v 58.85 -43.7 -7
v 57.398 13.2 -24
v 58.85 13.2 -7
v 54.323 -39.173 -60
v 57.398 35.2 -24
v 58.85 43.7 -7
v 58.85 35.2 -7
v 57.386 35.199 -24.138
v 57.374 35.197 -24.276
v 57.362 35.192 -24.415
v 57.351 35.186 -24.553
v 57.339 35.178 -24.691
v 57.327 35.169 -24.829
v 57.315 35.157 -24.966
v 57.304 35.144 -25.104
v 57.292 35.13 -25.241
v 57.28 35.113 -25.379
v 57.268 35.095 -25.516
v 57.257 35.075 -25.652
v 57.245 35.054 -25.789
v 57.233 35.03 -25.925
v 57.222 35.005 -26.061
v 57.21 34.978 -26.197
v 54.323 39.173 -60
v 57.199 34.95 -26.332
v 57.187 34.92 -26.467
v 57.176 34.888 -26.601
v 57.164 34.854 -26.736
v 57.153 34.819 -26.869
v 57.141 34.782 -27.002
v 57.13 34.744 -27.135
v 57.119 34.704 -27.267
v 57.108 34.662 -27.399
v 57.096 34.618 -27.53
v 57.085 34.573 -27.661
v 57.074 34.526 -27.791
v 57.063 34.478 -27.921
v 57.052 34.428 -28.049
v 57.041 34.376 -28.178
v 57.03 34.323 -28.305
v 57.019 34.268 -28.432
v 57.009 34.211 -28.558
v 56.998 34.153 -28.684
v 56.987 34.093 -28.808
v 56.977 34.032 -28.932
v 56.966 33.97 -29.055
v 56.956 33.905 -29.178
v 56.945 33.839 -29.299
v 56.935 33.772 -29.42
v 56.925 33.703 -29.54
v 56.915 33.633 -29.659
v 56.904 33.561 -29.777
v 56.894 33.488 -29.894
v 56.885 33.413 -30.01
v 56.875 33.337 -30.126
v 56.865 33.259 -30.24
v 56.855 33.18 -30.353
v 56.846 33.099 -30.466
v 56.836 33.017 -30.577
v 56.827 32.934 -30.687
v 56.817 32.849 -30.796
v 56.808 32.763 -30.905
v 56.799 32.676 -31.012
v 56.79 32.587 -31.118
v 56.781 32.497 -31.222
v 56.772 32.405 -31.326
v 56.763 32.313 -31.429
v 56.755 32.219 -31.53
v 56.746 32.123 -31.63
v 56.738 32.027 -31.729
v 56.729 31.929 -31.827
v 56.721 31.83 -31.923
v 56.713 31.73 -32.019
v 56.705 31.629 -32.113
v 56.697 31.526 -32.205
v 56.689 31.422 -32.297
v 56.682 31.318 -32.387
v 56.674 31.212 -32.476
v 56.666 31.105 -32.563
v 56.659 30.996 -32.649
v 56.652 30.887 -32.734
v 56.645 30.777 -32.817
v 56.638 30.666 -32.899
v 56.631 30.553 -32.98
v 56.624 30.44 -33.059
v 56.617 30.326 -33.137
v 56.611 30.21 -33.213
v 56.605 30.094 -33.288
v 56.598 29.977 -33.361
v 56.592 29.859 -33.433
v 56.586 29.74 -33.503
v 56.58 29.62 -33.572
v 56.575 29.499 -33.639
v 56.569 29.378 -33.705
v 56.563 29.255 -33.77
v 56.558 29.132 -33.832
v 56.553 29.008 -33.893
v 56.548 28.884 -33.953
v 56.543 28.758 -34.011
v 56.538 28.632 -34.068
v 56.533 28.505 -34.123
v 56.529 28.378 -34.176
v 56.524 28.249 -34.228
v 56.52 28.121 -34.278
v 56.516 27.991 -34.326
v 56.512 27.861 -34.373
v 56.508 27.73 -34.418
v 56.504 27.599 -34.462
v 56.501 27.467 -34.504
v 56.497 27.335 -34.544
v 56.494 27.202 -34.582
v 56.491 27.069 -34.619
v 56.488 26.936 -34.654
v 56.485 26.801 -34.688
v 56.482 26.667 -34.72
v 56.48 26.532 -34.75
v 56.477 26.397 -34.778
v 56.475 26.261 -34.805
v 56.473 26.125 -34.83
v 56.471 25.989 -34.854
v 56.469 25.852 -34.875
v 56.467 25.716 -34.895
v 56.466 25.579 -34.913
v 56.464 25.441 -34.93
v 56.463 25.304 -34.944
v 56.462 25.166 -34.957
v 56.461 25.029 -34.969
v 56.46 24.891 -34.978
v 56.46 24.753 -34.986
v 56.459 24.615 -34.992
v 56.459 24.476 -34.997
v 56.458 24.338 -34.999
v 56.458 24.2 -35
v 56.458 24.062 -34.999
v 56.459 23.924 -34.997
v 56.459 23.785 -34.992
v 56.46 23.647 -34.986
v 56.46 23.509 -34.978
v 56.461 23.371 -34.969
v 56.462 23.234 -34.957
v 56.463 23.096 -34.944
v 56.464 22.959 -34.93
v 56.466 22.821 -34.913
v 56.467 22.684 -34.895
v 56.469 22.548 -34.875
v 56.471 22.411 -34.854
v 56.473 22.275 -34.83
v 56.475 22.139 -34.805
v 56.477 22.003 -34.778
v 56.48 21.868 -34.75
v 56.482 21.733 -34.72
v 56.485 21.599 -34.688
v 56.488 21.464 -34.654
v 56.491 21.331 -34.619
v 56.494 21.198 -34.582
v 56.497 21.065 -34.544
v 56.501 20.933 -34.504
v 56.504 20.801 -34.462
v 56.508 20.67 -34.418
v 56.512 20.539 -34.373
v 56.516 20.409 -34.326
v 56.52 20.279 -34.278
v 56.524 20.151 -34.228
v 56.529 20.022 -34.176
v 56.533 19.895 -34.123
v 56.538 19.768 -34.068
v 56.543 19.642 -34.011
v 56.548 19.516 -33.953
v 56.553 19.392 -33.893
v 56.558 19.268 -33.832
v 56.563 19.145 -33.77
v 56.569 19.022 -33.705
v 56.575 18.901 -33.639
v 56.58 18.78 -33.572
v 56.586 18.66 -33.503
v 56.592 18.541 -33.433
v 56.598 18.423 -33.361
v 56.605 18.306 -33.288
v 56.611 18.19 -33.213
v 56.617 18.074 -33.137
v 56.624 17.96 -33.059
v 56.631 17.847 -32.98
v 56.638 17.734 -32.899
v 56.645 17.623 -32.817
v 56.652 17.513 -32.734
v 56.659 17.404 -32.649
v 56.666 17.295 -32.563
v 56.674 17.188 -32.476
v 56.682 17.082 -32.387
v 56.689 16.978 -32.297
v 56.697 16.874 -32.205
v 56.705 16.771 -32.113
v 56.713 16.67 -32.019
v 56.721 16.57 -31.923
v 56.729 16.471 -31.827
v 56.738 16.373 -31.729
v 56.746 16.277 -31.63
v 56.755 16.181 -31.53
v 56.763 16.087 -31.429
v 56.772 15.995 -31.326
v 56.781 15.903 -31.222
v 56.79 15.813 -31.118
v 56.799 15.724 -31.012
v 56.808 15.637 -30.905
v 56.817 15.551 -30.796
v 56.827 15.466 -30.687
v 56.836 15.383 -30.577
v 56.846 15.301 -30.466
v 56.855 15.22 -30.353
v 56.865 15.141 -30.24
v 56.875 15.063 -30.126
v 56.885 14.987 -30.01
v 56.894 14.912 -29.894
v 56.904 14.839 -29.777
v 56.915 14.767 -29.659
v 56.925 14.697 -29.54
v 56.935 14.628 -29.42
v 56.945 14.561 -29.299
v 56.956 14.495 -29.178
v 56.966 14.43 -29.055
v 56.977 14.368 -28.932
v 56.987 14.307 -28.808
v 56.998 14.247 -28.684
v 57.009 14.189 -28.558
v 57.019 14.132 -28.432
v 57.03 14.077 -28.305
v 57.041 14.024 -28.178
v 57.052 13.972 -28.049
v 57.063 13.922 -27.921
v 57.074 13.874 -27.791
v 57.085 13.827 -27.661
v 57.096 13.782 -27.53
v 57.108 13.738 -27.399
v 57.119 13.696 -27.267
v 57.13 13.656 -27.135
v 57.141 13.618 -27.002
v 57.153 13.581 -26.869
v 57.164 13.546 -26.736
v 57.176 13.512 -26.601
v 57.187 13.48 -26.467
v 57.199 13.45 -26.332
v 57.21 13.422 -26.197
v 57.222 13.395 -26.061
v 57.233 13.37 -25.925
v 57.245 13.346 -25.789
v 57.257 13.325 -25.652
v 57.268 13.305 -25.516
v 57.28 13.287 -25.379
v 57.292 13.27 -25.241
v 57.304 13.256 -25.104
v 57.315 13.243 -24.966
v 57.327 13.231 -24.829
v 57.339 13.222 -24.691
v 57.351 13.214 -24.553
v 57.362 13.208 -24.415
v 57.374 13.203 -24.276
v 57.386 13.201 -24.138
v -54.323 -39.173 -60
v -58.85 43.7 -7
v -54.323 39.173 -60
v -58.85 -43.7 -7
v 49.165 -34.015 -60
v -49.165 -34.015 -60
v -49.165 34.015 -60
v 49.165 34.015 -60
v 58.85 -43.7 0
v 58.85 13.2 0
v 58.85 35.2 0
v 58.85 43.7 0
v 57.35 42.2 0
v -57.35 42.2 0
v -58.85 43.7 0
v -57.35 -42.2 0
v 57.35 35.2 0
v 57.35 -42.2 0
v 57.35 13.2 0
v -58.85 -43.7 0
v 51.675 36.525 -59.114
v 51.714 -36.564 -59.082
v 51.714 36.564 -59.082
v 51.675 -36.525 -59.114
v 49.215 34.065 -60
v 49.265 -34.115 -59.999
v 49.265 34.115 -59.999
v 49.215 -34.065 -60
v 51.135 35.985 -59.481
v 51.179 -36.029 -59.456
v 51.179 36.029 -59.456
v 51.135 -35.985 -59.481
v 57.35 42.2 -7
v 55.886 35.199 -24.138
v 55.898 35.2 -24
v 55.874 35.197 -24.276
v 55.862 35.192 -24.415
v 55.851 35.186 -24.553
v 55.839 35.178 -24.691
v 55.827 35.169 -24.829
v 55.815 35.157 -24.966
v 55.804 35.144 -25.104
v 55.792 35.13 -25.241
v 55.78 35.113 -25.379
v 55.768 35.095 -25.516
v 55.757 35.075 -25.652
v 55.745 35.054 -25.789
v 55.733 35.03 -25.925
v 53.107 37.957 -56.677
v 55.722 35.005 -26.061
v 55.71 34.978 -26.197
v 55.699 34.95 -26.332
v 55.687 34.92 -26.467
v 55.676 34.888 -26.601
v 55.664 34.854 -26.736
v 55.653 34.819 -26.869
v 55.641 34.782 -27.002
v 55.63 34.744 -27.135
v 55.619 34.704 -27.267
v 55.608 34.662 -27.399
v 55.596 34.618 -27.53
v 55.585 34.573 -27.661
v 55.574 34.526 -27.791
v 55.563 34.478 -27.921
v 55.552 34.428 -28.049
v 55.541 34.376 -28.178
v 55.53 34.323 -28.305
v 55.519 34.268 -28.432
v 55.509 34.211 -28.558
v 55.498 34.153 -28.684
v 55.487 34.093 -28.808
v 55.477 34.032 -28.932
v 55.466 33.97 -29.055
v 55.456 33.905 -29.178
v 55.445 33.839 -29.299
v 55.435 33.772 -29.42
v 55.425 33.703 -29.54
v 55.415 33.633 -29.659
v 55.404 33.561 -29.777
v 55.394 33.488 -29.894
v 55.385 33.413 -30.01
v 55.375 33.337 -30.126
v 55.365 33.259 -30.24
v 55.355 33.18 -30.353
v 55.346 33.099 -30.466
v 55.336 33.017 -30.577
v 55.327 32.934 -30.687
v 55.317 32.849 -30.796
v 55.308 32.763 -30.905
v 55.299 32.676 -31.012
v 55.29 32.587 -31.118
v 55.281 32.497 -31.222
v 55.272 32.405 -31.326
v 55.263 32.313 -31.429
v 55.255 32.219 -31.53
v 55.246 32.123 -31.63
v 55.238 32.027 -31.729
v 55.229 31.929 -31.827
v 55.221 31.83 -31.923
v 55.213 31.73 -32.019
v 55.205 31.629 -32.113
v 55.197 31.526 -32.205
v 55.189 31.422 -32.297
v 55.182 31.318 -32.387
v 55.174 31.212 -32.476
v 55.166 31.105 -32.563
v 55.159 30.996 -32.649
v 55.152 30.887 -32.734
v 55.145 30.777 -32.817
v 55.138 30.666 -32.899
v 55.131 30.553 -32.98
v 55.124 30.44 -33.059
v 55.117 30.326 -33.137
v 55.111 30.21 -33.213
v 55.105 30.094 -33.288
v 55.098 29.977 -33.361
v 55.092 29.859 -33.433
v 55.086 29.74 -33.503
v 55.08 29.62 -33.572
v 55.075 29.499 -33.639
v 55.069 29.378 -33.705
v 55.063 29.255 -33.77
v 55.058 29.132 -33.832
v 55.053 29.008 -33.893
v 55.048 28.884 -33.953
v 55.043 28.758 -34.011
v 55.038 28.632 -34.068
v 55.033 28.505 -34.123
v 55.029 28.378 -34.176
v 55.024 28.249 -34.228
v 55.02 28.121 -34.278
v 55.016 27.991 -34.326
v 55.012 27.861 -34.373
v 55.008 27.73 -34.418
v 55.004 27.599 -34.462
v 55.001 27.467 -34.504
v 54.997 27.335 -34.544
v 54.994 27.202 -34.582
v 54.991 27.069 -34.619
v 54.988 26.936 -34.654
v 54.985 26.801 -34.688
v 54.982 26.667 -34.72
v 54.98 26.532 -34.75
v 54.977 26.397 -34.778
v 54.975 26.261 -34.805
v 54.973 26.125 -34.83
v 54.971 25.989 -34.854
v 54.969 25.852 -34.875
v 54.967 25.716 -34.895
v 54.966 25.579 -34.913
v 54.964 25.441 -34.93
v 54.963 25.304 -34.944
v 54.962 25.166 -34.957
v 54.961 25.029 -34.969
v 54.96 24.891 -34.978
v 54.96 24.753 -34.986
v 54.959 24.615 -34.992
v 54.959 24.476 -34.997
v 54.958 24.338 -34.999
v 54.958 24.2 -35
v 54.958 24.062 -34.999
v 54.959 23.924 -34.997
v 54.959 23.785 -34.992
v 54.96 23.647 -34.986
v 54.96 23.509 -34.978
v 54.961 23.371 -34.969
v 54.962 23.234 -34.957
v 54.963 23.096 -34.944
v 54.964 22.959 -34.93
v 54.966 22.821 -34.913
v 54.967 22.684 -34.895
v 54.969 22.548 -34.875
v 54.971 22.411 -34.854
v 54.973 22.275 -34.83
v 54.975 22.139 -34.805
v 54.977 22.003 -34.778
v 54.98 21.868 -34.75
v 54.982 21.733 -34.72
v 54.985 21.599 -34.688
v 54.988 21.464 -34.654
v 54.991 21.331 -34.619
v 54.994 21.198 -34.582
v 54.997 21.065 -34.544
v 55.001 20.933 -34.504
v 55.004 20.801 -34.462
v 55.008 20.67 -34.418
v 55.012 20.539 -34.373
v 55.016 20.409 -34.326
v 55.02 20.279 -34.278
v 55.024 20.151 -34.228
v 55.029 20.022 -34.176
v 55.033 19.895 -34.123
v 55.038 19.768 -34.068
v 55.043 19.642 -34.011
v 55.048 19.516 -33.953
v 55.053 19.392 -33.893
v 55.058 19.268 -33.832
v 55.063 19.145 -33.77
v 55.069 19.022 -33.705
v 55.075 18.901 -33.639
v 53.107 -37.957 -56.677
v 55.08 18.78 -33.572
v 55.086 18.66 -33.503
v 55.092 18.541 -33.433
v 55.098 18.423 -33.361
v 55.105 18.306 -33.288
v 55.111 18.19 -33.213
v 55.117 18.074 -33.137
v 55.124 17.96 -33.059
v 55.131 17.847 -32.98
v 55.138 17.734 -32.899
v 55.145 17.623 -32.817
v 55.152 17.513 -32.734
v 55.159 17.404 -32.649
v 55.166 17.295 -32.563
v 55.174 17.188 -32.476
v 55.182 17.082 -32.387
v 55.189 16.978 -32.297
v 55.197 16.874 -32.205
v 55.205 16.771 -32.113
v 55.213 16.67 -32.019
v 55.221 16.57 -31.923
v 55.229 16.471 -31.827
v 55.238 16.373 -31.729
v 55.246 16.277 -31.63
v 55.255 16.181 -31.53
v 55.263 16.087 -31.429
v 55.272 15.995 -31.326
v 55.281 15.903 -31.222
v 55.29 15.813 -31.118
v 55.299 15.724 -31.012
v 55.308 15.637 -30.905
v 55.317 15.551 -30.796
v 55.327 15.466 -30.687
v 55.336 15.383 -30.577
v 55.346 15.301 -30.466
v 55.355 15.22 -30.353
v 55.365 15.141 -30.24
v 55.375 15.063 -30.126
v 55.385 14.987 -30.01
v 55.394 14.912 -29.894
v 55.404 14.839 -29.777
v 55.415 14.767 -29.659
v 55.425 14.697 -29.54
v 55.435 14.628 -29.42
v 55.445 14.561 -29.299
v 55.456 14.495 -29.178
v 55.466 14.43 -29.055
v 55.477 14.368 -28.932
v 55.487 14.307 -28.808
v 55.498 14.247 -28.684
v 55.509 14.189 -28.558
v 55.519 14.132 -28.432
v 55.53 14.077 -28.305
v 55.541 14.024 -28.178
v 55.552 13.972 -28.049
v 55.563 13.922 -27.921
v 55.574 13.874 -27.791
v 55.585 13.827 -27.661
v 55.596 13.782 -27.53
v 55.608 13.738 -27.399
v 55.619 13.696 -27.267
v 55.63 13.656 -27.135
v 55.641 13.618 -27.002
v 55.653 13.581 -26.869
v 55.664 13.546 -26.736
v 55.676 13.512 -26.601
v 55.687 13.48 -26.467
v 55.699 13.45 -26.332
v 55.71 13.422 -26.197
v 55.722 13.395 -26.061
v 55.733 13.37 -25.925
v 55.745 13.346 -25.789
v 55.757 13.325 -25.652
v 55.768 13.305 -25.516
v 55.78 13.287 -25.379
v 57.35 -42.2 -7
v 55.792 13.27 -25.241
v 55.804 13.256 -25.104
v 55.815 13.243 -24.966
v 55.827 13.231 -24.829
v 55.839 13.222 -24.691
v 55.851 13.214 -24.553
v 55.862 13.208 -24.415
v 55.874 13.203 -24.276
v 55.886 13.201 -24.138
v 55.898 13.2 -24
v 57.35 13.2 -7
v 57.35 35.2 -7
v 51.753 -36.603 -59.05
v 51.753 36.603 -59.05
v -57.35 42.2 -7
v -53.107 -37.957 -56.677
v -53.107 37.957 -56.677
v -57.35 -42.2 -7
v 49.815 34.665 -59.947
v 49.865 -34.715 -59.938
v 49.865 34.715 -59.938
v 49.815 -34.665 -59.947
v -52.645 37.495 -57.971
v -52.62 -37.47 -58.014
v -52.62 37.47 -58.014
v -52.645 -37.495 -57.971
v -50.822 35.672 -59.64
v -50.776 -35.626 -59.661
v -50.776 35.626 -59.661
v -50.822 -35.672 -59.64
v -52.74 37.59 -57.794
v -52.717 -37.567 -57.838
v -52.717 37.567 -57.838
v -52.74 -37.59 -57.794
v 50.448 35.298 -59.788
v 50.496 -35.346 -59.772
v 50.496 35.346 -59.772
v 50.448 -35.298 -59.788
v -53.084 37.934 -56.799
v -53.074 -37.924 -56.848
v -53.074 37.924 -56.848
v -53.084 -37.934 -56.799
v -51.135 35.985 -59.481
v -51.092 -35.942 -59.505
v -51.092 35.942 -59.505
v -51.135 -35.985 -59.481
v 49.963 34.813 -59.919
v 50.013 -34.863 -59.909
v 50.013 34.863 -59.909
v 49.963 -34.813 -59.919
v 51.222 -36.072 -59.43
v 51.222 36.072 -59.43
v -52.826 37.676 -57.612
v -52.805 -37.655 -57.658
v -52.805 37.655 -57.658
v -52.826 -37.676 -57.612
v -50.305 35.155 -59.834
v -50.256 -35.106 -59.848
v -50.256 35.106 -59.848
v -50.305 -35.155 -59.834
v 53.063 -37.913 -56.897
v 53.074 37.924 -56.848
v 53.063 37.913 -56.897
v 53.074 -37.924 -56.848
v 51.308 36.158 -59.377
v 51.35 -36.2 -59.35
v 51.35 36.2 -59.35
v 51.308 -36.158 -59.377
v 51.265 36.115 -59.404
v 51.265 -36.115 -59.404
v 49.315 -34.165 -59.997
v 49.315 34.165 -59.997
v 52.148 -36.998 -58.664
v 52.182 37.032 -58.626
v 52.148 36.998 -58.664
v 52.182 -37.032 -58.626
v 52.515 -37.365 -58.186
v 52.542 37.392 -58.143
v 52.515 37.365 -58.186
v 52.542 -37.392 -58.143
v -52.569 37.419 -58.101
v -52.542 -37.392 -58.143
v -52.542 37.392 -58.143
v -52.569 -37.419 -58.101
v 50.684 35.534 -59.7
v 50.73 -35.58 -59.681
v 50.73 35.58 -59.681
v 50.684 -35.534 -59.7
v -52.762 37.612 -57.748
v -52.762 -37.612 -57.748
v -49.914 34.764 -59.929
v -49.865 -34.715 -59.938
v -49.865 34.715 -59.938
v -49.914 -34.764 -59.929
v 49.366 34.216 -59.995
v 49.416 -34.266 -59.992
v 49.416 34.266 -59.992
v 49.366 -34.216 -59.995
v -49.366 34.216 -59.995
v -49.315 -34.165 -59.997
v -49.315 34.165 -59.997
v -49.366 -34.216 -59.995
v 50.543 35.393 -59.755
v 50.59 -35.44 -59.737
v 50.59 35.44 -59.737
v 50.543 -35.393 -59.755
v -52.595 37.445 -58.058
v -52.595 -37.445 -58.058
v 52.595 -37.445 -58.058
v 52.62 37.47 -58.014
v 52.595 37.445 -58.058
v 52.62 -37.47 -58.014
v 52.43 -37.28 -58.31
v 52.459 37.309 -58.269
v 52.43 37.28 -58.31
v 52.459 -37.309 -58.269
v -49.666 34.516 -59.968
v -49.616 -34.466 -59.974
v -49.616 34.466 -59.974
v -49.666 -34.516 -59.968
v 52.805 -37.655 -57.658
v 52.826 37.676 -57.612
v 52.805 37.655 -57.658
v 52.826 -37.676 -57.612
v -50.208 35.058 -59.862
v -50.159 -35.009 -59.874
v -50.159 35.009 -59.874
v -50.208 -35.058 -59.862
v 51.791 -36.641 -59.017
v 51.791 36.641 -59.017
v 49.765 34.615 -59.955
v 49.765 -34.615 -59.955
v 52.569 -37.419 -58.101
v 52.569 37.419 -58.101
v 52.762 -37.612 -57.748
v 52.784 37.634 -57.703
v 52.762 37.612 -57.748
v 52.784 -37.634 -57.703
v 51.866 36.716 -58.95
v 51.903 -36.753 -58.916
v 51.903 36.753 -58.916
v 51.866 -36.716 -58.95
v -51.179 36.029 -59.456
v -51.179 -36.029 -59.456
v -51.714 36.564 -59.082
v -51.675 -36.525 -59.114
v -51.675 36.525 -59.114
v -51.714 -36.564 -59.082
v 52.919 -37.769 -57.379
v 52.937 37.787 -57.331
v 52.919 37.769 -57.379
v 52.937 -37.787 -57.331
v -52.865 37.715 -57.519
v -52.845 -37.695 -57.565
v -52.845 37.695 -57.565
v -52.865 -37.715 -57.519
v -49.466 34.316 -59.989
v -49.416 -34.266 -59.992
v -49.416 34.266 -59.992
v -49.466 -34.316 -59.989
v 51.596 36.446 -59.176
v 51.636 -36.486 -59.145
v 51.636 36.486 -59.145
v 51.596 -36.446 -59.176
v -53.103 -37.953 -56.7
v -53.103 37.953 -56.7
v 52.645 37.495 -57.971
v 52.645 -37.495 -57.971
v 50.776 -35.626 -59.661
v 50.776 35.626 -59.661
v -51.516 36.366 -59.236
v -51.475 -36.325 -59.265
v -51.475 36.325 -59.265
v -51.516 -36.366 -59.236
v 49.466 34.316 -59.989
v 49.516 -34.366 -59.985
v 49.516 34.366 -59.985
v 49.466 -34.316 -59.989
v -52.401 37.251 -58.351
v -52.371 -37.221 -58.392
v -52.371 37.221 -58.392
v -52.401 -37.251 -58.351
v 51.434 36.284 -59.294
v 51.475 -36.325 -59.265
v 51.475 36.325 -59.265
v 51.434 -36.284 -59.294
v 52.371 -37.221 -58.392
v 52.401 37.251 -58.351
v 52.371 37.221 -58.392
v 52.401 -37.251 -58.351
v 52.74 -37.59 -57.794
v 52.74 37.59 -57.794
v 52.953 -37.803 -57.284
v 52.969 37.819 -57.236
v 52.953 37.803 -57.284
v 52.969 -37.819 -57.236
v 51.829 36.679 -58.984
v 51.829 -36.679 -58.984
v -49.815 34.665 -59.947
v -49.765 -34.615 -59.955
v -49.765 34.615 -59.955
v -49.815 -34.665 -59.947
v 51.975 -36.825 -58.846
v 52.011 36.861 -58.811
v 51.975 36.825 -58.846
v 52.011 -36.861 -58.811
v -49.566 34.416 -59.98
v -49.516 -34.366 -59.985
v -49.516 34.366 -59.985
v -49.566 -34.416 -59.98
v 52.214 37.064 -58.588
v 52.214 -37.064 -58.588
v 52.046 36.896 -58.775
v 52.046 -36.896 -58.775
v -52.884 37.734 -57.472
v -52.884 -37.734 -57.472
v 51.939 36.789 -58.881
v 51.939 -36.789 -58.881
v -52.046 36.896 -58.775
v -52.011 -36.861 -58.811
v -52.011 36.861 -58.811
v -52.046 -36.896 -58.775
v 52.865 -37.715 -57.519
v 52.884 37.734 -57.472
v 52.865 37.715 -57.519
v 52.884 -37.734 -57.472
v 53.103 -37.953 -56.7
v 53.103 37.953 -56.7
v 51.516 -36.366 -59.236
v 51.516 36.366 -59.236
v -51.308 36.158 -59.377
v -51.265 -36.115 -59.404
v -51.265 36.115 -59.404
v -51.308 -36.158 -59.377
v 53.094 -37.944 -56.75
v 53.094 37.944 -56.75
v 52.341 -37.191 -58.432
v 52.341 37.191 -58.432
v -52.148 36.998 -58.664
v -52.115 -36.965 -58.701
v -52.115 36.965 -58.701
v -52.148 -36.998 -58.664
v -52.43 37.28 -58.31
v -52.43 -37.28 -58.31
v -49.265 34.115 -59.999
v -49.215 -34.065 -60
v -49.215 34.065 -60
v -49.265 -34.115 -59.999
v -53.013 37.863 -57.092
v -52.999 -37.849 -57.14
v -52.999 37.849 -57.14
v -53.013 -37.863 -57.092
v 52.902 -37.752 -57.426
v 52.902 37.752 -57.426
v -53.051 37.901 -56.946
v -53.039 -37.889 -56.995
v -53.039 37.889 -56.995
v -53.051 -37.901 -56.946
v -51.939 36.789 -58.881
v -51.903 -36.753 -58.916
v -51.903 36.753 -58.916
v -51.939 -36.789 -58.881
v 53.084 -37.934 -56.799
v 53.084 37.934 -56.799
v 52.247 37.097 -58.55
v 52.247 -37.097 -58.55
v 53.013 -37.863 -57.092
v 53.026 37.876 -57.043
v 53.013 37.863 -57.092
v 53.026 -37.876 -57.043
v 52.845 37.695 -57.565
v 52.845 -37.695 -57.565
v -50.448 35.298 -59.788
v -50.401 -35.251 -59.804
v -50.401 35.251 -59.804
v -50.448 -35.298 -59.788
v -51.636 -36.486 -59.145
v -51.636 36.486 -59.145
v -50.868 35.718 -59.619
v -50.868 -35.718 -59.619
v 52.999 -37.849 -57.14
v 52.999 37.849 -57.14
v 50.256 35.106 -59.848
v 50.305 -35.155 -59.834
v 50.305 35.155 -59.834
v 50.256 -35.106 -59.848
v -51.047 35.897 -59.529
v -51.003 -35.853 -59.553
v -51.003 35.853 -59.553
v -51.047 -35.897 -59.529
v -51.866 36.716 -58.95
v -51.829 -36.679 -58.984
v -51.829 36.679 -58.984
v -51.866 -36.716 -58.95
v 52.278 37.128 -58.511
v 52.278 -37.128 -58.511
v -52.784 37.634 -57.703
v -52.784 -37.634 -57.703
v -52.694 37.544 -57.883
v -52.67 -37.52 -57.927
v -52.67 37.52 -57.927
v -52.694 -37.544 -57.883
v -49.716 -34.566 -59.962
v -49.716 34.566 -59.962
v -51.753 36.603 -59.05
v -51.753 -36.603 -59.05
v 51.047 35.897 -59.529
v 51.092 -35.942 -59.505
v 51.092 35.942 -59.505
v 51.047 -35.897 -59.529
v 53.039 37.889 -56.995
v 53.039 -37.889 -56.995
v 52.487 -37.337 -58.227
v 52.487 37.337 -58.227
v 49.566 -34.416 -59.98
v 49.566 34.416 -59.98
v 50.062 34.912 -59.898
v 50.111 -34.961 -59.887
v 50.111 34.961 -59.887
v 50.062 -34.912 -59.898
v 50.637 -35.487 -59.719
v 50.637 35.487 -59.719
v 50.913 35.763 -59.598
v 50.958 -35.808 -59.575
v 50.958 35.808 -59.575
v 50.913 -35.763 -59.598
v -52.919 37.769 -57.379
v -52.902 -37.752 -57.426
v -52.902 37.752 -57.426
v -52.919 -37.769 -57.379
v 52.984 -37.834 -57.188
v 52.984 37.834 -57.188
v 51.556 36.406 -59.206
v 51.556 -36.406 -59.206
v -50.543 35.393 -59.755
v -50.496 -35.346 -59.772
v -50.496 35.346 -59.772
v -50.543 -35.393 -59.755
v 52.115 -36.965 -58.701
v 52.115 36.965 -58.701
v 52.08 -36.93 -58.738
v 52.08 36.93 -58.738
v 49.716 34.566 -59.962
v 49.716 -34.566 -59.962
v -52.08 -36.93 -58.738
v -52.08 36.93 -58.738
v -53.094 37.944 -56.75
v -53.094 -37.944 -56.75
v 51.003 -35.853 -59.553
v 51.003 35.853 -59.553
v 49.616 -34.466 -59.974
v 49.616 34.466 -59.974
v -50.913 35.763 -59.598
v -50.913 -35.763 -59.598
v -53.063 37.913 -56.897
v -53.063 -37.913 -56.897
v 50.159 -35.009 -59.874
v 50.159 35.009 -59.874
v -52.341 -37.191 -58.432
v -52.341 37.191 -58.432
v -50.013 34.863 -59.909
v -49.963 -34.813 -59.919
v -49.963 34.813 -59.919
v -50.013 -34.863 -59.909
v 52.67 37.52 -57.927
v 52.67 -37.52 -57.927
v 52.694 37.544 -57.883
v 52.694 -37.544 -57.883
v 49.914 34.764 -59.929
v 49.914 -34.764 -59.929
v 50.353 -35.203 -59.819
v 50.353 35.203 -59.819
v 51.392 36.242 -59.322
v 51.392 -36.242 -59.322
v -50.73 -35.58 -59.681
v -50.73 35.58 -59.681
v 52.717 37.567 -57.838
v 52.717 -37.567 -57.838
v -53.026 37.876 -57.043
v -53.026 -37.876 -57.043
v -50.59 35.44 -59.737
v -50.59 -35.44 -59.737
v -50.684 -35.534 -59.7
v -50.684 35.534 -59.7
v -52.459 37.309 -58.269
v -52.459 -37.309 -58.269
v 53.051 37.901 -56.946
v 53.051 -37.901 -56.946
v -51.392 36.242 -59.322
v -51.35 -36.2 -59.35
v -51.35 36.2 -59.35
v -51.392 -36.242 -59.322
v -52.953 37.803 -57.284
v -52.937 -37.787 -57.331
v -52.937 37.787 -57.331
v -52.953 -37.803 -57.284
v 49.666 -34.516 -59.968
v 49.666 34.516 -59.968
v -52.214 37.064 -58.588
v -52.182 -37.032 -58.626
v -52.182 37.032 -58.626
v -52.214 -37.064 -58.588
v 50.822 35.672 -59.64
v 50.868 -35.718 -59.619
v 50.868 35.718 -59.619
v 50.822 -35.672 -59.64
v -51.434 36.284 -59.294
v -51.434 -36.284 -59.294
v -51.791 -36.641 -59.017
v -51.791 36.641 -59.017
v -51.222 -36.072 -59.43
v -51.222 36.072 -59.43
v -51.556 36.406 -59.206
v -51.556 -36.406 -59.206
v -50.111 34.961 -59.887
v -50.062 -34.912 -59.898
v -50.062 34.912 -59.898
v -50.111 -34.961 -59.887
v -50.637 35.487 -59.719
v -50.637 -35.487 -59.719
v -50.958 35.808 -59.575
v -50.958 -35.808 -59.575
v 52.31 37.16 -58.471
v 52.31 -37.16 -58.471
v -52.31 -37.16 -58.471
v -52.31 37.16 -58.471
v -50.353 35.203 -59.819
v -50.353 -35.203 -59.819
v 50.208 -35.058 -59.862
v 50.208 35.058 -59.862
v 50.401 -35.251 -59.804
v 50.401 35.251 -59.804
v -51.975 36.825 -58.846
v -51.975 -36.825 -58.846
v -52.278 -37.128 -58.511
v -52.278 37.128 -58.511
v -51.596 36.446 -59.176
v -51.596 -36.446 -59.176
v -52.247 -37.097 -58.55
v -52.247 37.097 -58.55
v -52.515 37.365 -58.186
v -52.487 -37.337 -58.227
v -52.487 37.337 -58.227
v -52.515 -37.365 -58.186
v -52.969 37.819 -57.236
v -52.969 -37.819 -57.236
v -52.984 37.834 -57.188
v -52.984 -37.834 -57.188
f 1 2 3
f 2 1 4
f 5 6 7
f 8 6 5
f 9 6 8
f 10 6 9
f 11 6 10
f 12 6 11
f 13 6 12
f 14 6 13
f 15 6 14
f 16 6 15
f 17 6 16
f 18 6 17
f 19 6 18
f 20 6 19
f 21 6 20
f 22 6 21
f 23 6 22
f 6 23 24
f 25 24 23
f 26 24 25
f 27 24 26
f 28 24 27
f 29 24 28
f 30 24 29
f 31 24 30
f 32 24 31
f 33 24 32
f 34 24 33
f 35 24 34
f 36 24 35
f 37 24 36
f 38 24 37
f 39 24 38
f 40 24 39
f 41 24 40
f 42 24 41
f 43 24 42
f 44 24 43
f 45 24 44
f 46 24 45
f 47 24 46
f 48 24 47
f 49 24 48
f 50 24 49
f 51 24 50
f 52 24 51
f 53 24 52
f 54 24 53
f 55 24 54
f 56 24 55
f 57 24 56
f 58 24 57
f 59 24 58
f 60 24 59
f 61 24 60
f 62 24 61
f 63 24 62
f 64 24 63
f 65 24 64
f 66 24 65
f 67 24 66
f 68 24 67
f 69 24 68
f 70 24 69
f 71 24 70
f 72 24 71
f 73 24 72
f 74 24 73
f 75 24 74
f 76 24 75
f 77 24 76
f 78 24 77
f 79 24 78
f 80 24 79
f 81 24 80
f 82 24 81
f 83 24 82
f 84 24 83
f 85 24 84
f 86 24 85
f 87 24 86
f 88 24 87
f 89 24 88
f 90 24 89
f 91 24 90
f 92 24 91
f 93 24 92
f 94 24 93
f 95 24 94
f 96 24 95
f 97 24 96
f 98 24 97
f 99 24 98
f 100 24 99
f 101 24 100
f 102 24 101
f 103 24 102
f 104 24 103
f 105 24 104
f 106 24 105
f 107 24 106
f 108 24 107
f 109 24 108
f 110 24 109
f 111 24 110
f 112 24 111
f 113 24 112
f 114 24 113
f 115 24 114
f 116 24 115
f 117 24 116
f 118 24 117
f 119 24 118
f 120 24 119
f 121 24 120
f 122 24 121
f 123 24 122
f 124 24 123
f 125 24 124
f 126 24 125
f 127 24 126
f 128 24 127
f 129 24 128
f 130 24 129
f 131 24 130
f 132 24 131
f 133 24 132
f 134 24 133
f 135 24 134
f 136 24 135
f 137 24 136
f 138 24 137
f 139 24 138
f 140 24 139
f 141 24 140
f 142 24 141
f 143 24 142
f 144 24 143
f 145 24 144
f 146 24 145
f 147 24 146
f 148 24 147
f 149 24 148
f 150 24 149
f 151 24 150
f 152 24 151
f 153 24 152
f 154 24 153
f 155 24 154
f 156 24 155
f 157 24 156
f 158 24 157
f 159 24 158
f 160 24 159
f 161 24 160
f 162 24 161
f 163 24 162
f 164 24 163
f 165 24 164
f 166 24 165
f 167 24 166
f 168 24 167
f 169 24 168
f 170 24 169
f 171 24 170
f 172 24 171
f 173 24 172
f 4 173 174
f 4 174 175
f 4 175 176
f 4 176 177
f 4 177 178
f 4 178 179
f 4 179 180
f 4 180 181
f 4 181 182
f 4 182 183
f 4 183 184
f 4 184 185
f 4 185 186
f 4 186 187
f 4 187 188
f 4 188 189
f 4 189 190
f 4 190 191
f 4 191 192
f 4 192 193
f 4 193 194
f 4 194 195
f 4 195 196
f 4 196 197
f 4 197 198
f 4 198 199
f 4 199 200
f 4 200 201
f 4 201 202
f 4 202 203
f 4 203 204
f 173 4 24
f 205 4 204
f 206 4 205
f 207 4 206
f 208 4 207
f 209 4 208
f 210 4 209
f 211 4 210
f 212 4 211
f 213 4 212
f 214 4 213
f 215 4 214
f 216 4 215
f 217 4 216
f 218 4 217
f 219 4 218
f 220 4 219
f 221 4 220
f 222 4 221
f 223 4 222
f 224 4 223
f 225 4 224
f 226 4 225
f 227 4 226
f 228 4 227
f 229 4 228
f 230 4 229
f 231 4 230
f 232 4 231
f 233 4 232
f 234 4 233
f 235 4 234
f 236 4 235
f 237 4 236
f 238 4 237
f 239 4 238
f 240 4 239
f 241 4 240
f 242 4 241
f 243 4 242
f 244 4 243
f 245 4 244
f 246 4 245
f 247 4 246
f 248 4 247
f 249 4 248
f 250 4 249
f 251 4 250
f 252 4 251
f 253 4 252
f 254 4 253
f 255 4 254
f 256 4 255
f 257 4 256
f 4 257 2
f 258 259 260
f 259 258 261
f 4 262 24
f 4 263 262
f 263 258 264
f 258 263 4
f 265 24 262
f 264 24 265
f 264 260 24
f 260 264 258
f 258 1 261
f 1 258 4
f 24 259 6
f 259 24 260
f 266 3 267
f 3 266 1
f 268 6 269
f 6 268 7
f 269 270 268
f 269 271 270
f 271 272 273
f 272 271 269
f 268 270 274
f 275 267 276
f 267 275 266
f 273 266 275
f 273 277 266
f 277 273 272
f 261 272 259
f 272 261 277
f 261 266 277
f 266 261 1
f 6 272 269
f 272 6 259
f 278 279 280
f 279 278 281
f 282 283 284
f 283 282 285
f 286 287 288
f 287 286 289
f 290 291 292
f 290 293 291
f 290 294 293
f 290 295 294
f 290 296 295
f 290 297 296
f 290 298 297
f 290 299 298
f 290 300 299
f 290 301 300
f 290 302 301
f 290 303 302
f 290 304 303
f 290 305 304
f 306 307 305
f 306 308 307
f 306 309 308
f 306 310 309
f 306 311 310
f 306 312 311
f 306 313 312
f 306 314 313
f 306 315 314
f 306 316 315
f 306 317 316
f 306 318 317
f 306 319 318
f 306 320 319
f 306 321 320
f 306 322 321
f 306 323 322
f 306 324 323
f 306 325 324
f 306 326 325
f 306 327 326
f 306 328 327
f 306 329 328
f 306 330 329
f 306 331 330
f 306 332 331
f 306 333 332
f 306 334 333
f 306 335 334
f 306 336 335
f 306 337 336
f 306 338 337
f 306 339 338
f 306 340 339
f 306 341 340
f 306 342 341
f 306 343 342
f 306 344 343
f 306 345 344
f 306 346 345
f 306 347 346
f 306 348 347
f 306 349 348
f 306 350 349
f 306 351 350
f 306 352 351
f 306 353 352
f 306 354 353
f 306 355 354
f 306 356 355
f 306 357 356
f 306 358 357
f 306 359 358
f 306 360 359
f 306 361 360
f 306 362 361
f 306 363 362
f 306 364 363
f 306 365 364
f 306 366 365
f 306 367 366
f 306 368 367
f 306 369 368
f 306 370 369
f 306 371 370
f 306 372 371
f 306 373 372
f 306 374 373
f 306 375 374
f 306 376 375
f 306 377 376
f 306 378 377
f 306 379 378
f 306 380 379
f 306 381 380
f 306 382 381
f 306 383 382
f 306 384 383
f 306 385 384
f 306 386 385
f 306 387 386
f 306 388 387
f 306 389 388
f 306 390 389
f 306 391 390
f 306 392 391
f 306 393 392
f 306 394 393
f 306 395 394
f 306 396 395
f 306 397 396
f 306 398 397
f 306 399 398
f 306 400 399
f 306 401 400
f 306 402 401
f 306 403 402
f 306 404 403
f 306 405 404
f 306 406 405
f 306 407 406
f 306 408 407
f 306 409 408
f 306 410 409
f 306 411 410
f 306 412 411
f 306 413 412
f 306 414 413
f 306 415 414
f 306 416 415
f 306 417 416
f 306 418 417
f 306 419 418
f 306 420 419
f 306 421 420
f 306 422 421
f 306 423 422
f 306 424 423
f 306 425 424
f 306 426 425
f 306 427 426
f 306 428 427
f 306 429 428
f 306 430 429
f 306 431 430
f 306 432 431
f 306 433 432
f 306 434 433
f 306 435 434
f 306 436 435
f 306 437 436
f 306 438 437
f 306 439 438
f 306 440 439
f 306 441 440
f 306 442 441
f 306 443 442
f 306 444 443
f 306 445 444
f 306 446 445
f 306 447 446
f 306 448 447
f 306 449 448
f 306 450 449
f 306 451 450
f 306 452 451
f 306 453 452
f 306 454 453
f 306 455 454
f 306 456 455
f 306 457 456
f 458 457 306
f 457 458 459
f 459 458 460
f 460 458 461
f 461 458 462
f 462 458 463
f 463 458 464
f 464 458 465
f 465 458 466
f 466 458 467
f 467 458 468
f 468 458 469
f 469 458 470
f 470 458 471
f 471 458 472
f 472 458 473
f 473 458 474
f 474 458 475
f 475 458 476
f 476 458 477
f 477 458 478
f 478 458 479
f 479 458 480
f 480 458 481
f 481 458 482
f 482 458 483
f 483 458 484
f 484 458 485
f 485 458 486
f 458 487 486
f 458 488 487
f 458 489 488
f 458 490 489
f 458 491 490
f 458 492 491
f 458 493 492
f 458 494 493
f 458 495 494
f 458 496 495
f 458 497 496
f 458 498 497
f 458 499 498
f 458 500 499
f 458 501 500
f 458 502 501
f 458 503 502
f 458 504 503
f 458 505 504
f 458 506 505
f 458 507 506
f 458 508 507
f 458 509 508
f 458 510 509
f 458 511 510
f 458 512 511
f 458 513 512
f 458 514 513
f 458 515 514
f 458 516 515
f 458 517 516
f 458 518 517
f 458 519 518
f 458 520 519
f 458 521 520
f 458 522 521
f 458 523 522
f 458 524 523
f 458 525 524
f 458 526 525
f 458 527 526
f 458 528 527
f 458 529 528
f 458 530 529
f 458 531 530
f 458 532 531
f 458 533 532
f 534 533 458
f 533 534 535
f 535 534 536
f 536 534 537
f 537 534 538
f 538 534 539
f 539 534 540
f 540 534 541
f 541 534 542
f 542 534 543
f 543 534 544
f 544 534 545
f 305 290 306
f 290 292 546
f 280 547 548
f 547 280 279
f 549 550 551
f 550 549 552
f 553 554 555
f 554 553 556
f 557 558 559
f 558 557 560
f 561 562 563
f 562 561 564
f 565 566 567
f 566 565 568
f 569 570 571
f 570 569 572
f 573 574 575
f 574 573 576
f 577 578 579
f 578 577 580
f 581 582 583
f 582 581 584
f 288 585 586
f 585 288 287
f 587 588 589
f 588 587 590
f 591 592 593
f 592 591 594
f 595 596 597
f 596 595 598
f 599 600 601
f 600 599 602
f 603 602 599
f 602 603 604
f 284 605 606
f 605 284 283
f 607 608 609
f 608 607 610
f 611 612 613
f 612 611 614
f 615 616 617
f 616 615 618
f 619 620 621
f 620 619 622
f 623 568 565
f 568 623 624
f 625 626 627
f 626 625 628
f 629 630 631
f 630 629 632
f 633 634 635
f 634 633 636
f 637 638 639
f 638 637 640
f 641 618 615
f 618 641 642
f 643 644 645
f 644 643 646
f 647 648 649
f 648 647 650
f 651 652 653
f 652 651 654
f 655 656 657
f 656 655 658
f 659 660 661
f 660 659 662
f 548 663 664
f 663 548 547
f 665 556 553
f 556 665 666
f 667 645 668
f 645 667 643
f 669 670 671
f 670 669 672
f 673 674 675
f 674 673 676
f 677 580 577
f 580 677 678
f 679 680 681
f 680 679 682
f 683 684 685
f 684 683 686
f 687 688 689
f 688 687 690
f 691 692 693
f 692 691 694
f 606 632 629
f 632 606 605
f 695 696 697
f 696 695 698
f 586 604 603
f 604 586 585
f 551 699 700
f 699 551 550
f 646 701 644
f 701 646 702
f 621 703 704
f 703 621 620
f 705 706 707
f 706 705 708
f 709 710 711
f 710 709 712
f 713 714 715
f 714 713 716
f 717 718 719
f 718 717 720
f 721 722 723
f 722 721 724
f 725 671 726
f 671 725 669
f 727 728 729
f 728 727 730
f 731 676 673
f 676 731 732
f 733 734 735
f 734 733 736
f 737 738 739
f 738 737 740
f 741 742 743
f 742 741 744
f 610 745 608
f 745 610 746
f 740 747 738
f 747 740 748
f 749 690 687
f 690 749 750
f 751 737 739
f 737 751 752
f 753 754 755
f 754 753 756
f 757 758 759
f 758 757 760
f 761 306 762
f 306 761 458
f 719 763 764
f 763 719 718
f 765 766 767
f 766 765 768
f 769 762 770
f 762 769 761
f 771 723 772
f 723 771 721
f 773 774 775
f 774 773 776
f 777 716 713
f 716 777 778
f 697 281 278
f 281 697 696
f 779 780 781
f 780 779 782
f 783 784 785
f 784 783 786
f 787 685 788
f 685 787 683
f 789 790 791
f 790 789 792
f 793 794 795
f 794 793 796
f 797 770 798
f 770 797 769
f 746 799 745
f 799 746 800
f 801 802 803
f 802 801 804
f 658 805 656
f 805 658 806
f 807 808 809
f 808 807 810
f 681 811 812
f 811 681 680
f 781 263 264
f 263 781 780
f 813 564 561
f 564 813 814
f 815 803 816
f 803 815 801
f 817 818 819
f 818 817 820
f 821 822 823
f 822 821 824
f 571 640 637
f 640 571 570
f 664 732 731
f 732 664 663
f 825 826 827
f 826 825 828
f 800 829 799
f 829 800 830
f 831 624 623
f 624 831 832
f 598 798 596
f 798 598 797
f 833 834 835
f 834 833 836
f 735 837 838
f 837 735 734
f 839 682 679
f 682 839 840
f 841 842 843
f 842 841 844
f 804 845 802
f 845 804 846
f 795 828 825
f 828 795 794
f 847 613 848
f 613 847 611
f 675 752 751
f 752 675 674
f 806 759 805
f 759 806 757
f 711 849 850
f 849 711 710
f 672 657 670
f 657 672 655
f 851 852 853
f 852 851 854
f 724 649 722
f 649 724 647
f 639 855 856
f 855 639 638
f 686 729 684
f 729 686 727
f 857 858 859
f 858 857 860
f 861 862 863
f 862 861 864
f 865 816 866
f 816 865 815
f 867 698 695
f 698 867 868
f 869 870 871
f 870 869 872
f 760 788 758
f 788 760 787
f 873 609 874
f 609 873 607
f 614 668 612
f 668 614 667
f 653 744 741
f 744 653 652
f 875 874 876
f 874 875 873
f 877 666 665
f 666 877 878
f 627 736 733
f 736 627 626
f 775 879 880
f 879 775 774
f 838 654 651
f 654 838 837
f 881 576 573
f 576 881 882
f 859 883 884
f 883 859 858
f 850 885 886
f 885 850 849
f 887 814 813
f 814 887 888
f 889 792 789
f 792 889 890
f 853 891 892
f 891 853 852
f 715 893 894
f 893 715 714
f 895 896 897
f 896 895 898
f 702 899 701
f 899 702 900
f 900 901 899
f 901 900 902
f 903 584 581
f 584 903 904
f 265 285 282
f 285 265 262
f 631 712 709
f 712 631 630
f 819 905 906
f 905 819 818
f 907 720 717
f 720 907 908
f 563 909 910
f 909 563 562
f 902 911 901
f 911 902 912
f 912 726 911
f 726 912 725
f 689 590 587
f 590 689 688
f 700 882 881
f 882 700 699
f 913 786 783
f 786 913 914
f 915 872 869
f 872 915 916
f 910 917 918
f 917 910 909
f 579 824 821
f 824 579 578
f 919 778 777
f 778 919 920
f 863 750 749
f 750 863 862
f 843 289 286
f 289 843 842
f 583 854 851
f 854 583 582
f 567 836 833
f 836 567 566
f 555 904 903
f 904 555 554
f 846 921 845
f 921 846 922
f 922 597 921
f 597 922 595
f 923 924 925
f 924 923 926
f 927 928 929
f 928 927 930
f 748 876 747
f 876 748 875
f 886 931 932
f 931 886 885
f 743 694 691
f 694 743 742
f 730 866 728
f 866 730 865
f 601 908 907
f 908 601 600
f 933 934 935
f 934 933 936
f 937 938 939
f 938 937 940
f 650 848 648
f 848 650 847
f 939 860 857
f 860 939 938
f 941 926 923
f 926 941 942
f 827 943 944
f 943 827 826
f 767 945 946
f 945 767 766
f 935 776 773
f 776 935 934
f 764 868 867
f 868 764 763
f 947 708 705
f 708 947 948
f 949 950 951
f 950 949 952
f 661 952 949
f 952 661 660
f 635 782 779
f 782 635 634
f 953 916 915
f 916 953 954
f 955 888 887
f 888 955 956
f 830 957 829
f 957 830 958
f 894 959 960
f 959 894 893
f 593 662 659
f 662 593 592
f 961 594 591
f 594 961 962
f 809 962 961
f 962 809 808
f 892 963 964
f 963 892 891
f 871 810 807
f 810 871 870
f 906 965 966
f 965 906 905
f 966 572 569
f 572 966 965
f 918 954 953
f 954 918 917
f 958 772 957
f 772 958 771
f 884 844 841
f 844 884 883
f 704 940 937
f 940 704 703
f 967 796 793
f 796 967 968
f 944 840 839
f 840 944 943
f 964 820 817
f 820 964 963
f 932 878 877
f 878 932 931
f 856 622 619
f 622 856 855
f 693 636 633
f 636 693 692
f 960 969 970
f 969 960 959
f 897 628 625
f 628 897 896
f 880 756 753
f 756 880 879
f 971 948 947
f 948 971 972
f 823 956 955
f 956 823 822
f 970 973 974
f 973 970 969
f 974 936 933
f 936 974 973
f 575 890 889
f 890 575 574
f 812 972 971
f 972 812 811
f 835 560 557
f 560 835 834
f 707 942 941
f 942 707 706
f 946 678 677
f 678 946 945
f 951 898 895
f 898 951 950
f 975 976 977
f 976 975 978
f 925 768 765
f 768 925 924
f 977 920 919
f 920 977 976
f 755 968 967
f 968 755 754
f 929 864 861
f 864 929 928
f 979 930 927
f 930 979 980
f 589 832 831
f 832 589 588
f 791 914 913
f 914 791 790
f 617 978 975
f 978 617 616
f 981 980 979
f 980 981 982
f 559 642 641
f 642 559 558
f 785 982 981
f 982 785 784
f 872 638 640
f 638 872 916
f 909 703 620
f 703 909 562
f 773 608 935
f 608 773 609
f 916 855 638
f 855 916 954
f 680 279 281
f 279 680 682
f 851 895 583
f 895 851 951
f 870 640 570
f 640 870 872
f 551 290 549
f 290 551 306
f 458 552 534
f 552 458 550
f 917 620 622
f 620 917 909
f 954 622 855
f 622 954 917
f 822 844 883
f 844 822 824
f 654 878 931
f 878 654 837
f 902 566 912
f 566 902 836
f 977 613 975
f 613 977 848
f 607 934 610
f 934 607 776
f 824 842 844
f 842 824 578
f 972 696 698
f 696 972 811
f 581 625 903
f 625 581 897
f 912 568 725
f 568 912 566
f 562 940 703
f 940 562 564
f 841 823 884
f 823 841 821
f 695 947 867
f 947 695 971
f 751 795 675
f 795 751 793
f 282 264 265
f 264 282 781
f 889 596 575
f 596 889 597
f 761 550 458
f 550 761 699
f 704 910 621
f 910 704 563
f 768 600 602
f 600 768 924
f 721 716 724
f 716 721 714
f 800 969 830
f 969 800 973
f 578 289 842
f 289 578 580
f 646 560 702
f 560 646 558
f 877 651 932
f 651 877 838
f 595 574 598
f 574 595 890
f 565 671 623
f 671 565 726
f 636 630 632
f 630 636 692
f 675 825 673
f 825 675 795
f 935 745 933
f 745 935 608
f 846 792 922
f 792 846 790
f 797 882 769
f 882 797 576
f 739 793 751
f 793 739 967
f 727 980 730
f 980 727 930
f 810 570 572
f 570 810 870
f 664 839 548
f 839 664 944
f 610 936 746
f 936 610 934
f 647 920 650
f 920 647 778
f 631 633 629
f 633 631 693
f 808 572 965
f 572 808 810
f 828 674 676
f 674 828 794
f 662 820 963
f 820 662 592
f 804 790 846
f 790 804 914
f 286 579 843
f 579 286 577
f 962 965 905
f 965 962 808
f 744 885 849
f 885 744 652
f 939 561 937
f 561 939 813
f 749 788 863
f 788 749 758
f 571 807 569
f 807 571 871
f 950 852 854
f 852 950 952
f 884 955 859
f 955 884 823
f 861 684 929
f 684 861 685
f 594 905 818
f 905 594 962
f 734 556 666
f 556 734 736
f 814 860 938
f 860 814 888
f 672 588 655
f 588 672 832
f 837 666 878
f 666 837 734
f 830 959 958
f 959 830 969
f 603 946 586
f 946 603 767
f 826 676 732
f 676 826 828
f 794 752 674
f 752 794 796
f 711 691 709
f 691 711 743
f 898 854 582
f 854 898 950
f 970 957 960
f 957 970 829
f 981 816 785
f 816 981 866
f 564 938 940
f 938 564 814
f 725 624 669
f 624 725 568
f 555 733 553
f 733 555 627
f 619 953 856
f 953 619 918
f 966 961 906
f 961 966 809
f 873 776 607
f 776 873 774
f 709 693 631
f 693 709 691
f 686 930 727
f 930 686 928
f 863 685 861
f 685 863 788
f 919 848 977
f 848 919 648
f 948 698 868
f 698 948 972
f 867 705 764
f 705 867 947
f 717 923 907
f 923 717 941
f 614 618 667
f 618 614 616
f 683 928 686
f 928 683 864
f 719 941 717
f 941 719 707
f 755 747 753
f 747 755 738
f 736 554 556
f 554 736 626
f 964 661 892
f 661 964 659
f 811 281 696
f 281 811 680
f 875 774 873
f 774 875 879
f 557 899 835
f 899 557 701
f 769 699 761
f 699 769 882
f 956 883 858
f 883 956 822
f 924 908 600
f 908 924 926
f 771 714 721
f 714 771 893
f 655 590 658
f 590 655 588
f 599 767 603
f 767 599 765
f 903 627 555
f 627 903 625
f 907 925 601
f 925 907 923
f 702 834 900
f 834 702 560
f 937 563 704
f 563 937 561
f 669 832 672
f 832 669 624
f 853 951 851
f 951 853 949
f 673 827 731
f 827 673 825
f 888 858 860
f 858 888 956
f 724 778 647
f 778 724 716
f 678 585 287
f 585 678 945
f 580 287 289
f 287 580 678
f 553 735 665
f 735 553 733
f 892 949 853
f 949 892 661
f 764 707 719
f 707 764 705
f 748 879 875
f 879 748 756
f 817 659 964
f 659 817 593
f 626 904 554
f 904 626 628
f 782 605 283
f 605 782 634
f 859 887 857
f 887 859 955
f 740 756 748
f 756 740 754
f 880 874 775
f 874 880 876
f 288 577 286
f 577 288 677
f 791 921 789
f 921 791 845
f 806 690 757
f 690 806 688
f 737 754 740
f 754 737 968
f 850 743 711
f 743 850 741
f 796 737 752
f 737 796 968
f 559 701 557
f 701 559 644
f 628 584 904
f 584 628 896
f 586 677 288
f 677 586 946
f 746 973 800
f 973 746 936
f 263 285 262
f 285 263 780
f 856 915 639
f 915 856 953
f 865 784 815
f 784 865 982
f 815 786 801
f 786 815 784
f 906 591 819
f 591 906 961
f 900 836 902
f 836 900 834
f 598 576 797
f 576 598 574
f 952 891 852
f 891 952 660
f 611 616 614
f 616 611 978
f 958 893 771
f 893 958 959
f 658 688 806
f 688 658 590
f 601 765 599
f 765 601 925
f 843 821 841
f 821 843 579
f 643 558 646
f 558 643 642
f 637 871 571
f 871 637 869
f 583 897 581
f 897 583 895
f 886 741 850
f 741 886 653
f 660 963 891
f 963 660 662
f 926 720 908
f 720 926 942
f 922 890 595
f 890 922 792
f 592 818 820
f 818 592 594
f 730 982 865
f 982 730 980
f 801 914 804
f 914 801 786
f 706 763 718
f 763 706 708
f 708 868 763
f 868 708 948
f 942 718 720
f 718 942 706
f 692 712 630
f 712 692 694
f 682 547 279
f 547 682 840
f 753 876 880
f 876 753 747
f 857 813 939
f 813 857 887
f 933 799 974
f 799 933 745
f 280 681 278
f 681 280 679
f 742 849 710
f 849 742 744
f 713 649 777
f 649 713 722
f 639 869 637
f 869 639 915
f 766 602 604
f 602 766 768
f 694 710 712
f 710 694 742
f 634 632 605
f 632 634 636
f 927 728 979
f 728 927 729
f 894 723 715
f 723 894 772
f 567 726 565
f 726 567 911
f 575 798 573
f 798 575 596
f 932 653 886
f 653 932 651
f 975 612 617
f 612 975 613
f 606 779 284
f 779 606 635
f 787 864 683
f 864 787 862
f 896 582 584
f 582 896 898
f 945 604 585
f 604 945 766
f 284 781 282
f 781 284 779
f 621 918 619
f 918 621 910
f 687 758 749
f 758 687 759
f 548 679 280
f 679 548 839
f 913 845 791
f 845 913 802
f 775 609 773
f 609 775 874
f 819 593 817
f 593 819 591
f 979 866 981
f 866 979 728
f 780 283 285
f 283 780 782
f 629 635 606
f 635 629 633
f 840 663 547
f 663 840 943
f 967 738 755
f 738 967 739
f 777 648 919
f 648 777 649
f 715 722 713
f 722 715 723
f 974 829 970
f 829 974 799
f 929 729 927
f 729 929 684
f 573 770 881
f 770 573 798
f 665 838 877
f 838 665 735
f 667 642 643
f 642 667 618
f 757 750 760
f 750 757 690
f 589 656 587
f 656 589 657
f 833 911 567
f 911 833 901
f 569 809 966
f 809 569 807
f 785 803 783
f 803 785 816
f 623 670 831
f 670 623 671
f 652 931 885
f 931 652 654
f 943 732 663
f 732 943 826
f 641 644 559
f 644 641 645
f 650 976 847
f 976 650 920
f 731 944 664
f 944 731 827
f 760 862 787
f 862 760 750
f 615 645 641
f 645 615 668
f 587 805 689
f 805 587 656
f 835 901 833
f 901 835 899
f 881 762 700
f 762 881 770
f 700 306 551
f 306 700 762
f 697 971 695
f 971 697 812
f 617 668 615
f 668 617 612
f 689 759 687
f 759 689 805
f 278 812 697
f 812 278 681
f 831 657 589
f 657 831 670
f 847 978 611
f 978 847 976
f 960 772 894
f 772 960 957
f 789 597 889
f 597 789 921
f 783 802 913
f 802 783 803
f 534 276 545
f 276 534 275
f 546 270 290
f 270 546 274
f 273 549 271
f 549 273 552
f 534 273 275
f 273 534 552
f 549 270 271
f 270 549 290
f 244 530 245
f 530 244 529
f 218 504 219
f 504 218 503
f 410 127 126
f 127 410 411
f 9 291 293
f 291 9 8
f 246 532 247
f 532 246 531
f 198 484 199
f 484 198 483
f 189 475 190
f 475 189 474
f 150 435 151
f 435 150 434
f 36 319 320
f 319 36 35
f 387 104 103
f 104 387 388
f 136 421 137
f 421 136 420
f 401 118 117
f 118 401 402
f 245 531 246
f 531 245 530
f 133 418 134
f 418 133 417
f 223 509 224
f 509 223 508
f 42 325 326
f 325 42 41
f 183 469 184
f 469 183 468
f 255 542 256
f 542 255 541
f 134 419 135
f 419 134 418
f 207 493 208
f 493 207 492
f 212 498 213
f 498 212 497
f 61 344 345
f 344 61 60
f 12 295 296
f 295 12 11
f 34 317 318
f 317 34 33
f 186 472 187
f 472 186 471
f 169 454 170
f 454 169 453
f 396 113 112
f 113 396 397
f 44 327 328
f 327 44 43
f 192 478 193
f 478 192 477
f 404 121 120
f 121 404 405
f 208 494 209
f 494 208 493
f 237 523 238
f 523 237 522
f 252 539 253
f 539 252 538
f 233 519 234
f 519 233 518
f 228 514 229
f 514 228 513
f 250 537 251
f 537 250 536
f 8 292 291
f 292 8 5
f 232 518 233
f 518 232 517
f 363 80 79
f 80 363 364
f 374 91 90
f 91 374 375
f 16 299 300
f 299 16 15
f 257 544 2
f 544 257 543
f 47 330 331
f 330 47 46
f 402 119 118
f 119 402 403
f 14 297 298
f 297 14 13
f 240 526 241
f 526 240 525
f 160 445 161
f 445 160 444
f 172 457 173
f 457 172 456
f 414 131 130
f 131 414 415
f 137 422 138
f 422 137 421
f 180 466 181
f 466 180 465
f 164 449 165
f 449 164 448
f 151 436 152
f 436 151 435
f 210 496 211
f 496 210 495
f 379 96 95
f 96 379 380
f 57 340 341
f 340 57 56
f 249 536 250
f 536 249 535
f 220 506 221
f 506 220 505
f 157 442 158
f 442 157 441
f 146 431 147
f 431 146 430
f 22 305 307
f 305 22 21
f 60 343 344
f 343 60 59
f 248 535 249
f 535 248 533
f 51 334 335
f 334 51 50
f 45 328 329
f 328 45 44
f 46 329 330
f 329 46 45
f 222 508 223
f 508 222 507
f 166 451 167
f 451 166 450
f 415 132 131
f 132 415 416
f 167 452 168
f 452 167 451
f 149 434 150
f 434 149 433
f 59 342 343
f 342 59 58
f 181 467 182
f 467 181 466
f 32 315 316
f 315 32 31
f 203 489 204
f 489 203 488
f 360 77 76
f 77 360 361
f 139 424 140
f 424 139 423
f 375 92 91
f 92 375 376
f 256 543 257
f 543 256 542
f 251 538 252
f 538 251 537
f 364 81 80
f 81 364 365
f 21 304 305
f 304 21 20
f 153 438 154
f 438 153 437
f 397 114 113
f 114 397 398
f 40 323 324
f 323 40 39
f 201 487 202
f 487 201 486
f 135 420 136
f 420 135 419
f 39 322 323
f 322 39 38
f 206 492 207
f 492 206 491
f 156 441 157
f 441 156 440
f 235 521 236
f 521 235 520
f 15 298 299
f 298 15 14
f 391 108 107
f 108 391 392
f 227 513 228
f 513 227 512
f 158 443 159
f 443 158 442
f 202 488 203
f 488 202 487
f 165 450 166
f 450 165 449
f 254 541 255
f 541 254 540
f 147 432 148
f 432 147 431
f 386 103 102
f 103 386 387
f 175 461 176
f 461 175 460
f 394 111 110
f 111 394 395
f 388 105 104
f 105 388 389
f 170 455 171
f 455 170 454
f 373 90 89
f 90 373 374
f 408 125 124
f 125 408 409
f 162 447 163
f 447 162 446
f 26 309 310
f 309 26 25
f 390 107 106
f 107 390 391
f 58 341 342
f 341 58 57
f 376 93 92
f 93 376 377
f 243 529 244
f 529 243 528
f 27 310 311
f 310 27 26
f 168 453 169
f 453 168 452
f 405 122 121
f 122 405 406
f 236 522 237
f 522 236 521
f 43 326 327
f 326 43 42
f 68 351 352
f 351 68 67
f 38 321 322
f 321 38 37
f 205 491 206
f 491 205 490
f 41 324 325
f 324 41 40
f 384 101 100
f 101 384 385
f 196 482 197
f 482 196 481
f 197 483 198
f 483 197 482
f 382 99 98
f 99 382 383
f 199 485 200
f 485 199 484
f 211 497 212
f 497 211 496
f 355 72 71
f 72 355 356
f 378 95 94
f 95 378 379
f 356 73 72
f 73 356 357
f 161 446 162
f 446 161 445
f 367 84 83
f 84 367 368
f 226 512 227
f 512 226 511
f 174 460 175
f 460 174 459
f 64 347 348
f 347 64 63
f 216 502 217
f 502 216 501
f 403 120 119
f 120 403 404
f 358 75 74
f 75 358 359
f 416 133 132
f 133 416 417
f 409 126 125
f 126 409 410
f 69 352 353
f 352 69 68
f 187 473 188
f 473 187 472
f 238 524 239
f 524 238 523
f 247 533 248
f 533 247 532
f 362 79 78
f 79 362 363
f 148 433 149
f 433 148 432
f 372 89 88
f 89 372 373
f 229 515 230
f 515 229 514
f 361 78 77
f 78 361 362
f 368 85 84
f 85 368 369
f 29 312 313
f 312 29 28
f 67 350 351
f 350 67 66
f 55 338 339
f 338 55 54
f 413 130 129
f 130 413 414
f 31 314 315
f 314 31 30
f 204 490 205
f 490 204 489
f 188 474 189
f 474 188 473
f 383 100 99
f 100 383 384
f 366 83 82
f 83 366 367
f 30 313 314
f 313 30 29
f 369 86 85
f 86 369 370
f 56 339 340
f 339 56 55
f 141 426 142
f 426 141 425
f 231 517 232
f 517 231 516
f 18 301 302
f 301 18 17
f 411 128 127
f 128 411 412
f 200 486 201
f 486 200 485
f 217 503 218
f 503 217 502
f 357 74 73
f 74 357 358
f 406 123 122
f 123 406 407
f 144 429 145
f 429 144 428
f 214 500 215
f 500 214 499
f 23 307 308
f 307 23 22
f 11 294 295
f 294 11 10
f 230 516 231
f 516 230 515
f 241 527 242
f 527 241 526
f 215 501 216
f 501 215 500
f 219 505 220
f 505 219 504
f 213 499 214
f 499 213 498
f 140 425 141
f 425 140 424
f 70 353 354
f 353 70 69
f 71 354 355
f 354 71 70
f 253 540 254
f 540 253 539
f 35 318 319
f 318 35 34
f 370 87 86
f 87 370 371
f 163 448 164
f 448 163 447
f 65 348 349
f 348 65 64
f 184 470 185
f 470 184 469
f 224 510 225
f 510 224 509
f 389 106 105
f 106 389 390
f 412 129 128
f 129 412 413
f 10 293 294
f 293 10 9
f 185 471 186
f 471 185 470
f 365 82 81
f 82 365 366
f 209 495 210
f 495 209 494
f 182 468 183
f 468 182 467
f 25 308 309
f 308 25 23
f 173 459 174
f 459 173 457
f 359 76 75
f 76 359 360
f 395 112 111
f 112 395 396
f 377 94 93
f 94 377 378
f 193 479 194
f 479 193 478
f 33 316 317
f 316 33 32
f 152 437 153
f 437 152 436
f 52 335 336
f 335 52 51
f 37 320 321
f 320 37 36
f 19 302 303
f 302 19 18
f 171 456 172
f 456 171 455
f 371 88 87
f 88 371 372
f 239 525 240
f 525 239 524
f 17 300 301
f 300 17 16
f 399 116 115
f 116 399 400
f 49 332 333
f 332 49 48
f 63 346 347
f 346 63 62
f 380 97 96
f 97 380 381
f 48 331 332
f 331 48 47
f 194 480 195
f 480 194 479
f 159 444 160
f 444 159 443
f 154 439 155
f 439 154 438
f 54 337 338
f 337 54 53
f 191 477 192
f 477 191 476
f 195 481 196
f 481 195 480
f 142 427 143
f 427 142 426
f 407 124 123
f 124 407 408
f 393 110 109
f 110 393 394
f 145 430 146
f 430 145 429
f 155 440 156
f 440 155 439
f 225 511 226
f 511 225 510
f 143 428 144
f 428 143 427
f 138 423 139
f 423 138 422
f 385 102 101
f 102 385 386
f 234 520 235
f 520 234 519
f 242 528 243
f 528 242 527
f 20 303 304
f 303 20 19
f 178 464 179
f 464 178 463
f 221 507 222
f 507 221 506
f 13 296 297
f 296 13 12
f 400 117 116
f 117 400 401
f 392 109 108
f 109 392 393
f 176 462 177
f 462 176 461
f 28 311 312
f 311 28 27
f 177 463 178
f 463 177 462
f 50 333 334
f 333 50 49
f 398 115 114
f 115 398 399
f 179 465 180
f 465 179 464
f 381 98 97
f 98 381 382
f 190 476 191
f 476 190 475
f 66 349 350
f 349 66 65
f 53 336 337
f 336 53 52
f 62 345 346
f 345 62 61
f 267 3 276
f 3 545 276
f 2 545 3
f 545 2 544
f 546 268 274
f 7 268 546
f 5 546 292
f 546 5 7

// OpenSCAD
$fn = 100;
// ABS: environ 1mm de retrait
// longueur_b = 4.10 * 25.4;
longueur_b = 113.8 + 0.9;
// largeur_b = 2.60 * 25.4;
largeur_b = 83.5 + 0.9;
hauteur_b = 60;
hauteur_b_droite = 7;
angle=4.9;
conge=4;
base_ep = 2;
murs_ep = 1.5;

hole_l = 22;
hole_x = 18;
hole_z = 24;

module hole() {
	translate([-murs_ep*2, 0, 0]) rotate([0,90,0]) union () {
		cylinder(d = hole_l, h=murs_ep * 4, $fn = 500);
		translate([0, -hole_l/2, 0]) cube([hole_z, hole_l, murs_ep * 4]);
	};
}

module coupe_conge(r) {
	translate([-(r - r * sin(angle)), -r, 0]) difference() {
		polygon(points = [
		    [0, 0],
		    [0, r],
		    [(r - r * sin(angle)), r],
		    [r, 0]
		    ]);
		circle(r = r, $fn = 500);
	};
}

module trapeze_conge(longueur, hauteur, r) {
	difference() {
	    polygon(points = [
		[-longueur/2, 0],
		[-(longueur/2 - hauteur * sin(angle)), hauteur],
		[(longueur/2 - hauteur * sin(angle)), hauteur],
		[longueur/2, 0]
		]);
	    translate([-(longueur/2 - hauteur * sin(angle)), hauteur, 0])
		rotate([0,180,0]) coupe_conge(r = r);
	    translate([(longueur/2 - hauteur * sin(angle)), hauteur, 0])
		coupe_conge(r = r);
	};
}

module pyramidal_1(longueur, largeur, hauteur, r) {
	rotate([90,0,0]) linear_extrude(height=largeur, center=true, convexity=10, twist=0)
	    trapeze_conge(longueur=longueur, hauteur=hauteur, r = r);
}

module pyramidal(longueur, largeur, hauteur, r) {
	intersection() {
		pyramidal_1(longueur, largeur, hauteur, r);
		rotate([0,0,90]) pyramidal_1(largeur, longueur, hauteur, r);
	}
}

module base(longueur, largeur, hauteur, r) {
	union() {
		translate([0,0,hauteur_b_droite / 2]) cube([longueur, largeur, hauteur_b_droite], center = true);
		translate([0,0,hauteur_b_droite]) pyramidal(longueur, largeur, hauteur_b - hauteur_b_droite, r);
	}
}
	

module box() {
	rotate([180,0,0]) difference() {
		base(longueur_b+murs_ep*2, largeur_b+murs_ep*2, hauteur_b+base_ep, 0);
		base(longueur_b, largeur_b, hauteur_b, 4);
		translate([longueur_b/2, -largeur_b/2+hole_x, hole_z]) hole();
	};
}

box();

// difference() {
//  	box();
//  	translate([0,0,-hauteur_b / 2 - 20]) cube([longueur_b+10, largeur_b+10, hauteur_b], center=true);
// };
// hole();

// projection(cut=true) translate([0,0, -0.1]) box();
